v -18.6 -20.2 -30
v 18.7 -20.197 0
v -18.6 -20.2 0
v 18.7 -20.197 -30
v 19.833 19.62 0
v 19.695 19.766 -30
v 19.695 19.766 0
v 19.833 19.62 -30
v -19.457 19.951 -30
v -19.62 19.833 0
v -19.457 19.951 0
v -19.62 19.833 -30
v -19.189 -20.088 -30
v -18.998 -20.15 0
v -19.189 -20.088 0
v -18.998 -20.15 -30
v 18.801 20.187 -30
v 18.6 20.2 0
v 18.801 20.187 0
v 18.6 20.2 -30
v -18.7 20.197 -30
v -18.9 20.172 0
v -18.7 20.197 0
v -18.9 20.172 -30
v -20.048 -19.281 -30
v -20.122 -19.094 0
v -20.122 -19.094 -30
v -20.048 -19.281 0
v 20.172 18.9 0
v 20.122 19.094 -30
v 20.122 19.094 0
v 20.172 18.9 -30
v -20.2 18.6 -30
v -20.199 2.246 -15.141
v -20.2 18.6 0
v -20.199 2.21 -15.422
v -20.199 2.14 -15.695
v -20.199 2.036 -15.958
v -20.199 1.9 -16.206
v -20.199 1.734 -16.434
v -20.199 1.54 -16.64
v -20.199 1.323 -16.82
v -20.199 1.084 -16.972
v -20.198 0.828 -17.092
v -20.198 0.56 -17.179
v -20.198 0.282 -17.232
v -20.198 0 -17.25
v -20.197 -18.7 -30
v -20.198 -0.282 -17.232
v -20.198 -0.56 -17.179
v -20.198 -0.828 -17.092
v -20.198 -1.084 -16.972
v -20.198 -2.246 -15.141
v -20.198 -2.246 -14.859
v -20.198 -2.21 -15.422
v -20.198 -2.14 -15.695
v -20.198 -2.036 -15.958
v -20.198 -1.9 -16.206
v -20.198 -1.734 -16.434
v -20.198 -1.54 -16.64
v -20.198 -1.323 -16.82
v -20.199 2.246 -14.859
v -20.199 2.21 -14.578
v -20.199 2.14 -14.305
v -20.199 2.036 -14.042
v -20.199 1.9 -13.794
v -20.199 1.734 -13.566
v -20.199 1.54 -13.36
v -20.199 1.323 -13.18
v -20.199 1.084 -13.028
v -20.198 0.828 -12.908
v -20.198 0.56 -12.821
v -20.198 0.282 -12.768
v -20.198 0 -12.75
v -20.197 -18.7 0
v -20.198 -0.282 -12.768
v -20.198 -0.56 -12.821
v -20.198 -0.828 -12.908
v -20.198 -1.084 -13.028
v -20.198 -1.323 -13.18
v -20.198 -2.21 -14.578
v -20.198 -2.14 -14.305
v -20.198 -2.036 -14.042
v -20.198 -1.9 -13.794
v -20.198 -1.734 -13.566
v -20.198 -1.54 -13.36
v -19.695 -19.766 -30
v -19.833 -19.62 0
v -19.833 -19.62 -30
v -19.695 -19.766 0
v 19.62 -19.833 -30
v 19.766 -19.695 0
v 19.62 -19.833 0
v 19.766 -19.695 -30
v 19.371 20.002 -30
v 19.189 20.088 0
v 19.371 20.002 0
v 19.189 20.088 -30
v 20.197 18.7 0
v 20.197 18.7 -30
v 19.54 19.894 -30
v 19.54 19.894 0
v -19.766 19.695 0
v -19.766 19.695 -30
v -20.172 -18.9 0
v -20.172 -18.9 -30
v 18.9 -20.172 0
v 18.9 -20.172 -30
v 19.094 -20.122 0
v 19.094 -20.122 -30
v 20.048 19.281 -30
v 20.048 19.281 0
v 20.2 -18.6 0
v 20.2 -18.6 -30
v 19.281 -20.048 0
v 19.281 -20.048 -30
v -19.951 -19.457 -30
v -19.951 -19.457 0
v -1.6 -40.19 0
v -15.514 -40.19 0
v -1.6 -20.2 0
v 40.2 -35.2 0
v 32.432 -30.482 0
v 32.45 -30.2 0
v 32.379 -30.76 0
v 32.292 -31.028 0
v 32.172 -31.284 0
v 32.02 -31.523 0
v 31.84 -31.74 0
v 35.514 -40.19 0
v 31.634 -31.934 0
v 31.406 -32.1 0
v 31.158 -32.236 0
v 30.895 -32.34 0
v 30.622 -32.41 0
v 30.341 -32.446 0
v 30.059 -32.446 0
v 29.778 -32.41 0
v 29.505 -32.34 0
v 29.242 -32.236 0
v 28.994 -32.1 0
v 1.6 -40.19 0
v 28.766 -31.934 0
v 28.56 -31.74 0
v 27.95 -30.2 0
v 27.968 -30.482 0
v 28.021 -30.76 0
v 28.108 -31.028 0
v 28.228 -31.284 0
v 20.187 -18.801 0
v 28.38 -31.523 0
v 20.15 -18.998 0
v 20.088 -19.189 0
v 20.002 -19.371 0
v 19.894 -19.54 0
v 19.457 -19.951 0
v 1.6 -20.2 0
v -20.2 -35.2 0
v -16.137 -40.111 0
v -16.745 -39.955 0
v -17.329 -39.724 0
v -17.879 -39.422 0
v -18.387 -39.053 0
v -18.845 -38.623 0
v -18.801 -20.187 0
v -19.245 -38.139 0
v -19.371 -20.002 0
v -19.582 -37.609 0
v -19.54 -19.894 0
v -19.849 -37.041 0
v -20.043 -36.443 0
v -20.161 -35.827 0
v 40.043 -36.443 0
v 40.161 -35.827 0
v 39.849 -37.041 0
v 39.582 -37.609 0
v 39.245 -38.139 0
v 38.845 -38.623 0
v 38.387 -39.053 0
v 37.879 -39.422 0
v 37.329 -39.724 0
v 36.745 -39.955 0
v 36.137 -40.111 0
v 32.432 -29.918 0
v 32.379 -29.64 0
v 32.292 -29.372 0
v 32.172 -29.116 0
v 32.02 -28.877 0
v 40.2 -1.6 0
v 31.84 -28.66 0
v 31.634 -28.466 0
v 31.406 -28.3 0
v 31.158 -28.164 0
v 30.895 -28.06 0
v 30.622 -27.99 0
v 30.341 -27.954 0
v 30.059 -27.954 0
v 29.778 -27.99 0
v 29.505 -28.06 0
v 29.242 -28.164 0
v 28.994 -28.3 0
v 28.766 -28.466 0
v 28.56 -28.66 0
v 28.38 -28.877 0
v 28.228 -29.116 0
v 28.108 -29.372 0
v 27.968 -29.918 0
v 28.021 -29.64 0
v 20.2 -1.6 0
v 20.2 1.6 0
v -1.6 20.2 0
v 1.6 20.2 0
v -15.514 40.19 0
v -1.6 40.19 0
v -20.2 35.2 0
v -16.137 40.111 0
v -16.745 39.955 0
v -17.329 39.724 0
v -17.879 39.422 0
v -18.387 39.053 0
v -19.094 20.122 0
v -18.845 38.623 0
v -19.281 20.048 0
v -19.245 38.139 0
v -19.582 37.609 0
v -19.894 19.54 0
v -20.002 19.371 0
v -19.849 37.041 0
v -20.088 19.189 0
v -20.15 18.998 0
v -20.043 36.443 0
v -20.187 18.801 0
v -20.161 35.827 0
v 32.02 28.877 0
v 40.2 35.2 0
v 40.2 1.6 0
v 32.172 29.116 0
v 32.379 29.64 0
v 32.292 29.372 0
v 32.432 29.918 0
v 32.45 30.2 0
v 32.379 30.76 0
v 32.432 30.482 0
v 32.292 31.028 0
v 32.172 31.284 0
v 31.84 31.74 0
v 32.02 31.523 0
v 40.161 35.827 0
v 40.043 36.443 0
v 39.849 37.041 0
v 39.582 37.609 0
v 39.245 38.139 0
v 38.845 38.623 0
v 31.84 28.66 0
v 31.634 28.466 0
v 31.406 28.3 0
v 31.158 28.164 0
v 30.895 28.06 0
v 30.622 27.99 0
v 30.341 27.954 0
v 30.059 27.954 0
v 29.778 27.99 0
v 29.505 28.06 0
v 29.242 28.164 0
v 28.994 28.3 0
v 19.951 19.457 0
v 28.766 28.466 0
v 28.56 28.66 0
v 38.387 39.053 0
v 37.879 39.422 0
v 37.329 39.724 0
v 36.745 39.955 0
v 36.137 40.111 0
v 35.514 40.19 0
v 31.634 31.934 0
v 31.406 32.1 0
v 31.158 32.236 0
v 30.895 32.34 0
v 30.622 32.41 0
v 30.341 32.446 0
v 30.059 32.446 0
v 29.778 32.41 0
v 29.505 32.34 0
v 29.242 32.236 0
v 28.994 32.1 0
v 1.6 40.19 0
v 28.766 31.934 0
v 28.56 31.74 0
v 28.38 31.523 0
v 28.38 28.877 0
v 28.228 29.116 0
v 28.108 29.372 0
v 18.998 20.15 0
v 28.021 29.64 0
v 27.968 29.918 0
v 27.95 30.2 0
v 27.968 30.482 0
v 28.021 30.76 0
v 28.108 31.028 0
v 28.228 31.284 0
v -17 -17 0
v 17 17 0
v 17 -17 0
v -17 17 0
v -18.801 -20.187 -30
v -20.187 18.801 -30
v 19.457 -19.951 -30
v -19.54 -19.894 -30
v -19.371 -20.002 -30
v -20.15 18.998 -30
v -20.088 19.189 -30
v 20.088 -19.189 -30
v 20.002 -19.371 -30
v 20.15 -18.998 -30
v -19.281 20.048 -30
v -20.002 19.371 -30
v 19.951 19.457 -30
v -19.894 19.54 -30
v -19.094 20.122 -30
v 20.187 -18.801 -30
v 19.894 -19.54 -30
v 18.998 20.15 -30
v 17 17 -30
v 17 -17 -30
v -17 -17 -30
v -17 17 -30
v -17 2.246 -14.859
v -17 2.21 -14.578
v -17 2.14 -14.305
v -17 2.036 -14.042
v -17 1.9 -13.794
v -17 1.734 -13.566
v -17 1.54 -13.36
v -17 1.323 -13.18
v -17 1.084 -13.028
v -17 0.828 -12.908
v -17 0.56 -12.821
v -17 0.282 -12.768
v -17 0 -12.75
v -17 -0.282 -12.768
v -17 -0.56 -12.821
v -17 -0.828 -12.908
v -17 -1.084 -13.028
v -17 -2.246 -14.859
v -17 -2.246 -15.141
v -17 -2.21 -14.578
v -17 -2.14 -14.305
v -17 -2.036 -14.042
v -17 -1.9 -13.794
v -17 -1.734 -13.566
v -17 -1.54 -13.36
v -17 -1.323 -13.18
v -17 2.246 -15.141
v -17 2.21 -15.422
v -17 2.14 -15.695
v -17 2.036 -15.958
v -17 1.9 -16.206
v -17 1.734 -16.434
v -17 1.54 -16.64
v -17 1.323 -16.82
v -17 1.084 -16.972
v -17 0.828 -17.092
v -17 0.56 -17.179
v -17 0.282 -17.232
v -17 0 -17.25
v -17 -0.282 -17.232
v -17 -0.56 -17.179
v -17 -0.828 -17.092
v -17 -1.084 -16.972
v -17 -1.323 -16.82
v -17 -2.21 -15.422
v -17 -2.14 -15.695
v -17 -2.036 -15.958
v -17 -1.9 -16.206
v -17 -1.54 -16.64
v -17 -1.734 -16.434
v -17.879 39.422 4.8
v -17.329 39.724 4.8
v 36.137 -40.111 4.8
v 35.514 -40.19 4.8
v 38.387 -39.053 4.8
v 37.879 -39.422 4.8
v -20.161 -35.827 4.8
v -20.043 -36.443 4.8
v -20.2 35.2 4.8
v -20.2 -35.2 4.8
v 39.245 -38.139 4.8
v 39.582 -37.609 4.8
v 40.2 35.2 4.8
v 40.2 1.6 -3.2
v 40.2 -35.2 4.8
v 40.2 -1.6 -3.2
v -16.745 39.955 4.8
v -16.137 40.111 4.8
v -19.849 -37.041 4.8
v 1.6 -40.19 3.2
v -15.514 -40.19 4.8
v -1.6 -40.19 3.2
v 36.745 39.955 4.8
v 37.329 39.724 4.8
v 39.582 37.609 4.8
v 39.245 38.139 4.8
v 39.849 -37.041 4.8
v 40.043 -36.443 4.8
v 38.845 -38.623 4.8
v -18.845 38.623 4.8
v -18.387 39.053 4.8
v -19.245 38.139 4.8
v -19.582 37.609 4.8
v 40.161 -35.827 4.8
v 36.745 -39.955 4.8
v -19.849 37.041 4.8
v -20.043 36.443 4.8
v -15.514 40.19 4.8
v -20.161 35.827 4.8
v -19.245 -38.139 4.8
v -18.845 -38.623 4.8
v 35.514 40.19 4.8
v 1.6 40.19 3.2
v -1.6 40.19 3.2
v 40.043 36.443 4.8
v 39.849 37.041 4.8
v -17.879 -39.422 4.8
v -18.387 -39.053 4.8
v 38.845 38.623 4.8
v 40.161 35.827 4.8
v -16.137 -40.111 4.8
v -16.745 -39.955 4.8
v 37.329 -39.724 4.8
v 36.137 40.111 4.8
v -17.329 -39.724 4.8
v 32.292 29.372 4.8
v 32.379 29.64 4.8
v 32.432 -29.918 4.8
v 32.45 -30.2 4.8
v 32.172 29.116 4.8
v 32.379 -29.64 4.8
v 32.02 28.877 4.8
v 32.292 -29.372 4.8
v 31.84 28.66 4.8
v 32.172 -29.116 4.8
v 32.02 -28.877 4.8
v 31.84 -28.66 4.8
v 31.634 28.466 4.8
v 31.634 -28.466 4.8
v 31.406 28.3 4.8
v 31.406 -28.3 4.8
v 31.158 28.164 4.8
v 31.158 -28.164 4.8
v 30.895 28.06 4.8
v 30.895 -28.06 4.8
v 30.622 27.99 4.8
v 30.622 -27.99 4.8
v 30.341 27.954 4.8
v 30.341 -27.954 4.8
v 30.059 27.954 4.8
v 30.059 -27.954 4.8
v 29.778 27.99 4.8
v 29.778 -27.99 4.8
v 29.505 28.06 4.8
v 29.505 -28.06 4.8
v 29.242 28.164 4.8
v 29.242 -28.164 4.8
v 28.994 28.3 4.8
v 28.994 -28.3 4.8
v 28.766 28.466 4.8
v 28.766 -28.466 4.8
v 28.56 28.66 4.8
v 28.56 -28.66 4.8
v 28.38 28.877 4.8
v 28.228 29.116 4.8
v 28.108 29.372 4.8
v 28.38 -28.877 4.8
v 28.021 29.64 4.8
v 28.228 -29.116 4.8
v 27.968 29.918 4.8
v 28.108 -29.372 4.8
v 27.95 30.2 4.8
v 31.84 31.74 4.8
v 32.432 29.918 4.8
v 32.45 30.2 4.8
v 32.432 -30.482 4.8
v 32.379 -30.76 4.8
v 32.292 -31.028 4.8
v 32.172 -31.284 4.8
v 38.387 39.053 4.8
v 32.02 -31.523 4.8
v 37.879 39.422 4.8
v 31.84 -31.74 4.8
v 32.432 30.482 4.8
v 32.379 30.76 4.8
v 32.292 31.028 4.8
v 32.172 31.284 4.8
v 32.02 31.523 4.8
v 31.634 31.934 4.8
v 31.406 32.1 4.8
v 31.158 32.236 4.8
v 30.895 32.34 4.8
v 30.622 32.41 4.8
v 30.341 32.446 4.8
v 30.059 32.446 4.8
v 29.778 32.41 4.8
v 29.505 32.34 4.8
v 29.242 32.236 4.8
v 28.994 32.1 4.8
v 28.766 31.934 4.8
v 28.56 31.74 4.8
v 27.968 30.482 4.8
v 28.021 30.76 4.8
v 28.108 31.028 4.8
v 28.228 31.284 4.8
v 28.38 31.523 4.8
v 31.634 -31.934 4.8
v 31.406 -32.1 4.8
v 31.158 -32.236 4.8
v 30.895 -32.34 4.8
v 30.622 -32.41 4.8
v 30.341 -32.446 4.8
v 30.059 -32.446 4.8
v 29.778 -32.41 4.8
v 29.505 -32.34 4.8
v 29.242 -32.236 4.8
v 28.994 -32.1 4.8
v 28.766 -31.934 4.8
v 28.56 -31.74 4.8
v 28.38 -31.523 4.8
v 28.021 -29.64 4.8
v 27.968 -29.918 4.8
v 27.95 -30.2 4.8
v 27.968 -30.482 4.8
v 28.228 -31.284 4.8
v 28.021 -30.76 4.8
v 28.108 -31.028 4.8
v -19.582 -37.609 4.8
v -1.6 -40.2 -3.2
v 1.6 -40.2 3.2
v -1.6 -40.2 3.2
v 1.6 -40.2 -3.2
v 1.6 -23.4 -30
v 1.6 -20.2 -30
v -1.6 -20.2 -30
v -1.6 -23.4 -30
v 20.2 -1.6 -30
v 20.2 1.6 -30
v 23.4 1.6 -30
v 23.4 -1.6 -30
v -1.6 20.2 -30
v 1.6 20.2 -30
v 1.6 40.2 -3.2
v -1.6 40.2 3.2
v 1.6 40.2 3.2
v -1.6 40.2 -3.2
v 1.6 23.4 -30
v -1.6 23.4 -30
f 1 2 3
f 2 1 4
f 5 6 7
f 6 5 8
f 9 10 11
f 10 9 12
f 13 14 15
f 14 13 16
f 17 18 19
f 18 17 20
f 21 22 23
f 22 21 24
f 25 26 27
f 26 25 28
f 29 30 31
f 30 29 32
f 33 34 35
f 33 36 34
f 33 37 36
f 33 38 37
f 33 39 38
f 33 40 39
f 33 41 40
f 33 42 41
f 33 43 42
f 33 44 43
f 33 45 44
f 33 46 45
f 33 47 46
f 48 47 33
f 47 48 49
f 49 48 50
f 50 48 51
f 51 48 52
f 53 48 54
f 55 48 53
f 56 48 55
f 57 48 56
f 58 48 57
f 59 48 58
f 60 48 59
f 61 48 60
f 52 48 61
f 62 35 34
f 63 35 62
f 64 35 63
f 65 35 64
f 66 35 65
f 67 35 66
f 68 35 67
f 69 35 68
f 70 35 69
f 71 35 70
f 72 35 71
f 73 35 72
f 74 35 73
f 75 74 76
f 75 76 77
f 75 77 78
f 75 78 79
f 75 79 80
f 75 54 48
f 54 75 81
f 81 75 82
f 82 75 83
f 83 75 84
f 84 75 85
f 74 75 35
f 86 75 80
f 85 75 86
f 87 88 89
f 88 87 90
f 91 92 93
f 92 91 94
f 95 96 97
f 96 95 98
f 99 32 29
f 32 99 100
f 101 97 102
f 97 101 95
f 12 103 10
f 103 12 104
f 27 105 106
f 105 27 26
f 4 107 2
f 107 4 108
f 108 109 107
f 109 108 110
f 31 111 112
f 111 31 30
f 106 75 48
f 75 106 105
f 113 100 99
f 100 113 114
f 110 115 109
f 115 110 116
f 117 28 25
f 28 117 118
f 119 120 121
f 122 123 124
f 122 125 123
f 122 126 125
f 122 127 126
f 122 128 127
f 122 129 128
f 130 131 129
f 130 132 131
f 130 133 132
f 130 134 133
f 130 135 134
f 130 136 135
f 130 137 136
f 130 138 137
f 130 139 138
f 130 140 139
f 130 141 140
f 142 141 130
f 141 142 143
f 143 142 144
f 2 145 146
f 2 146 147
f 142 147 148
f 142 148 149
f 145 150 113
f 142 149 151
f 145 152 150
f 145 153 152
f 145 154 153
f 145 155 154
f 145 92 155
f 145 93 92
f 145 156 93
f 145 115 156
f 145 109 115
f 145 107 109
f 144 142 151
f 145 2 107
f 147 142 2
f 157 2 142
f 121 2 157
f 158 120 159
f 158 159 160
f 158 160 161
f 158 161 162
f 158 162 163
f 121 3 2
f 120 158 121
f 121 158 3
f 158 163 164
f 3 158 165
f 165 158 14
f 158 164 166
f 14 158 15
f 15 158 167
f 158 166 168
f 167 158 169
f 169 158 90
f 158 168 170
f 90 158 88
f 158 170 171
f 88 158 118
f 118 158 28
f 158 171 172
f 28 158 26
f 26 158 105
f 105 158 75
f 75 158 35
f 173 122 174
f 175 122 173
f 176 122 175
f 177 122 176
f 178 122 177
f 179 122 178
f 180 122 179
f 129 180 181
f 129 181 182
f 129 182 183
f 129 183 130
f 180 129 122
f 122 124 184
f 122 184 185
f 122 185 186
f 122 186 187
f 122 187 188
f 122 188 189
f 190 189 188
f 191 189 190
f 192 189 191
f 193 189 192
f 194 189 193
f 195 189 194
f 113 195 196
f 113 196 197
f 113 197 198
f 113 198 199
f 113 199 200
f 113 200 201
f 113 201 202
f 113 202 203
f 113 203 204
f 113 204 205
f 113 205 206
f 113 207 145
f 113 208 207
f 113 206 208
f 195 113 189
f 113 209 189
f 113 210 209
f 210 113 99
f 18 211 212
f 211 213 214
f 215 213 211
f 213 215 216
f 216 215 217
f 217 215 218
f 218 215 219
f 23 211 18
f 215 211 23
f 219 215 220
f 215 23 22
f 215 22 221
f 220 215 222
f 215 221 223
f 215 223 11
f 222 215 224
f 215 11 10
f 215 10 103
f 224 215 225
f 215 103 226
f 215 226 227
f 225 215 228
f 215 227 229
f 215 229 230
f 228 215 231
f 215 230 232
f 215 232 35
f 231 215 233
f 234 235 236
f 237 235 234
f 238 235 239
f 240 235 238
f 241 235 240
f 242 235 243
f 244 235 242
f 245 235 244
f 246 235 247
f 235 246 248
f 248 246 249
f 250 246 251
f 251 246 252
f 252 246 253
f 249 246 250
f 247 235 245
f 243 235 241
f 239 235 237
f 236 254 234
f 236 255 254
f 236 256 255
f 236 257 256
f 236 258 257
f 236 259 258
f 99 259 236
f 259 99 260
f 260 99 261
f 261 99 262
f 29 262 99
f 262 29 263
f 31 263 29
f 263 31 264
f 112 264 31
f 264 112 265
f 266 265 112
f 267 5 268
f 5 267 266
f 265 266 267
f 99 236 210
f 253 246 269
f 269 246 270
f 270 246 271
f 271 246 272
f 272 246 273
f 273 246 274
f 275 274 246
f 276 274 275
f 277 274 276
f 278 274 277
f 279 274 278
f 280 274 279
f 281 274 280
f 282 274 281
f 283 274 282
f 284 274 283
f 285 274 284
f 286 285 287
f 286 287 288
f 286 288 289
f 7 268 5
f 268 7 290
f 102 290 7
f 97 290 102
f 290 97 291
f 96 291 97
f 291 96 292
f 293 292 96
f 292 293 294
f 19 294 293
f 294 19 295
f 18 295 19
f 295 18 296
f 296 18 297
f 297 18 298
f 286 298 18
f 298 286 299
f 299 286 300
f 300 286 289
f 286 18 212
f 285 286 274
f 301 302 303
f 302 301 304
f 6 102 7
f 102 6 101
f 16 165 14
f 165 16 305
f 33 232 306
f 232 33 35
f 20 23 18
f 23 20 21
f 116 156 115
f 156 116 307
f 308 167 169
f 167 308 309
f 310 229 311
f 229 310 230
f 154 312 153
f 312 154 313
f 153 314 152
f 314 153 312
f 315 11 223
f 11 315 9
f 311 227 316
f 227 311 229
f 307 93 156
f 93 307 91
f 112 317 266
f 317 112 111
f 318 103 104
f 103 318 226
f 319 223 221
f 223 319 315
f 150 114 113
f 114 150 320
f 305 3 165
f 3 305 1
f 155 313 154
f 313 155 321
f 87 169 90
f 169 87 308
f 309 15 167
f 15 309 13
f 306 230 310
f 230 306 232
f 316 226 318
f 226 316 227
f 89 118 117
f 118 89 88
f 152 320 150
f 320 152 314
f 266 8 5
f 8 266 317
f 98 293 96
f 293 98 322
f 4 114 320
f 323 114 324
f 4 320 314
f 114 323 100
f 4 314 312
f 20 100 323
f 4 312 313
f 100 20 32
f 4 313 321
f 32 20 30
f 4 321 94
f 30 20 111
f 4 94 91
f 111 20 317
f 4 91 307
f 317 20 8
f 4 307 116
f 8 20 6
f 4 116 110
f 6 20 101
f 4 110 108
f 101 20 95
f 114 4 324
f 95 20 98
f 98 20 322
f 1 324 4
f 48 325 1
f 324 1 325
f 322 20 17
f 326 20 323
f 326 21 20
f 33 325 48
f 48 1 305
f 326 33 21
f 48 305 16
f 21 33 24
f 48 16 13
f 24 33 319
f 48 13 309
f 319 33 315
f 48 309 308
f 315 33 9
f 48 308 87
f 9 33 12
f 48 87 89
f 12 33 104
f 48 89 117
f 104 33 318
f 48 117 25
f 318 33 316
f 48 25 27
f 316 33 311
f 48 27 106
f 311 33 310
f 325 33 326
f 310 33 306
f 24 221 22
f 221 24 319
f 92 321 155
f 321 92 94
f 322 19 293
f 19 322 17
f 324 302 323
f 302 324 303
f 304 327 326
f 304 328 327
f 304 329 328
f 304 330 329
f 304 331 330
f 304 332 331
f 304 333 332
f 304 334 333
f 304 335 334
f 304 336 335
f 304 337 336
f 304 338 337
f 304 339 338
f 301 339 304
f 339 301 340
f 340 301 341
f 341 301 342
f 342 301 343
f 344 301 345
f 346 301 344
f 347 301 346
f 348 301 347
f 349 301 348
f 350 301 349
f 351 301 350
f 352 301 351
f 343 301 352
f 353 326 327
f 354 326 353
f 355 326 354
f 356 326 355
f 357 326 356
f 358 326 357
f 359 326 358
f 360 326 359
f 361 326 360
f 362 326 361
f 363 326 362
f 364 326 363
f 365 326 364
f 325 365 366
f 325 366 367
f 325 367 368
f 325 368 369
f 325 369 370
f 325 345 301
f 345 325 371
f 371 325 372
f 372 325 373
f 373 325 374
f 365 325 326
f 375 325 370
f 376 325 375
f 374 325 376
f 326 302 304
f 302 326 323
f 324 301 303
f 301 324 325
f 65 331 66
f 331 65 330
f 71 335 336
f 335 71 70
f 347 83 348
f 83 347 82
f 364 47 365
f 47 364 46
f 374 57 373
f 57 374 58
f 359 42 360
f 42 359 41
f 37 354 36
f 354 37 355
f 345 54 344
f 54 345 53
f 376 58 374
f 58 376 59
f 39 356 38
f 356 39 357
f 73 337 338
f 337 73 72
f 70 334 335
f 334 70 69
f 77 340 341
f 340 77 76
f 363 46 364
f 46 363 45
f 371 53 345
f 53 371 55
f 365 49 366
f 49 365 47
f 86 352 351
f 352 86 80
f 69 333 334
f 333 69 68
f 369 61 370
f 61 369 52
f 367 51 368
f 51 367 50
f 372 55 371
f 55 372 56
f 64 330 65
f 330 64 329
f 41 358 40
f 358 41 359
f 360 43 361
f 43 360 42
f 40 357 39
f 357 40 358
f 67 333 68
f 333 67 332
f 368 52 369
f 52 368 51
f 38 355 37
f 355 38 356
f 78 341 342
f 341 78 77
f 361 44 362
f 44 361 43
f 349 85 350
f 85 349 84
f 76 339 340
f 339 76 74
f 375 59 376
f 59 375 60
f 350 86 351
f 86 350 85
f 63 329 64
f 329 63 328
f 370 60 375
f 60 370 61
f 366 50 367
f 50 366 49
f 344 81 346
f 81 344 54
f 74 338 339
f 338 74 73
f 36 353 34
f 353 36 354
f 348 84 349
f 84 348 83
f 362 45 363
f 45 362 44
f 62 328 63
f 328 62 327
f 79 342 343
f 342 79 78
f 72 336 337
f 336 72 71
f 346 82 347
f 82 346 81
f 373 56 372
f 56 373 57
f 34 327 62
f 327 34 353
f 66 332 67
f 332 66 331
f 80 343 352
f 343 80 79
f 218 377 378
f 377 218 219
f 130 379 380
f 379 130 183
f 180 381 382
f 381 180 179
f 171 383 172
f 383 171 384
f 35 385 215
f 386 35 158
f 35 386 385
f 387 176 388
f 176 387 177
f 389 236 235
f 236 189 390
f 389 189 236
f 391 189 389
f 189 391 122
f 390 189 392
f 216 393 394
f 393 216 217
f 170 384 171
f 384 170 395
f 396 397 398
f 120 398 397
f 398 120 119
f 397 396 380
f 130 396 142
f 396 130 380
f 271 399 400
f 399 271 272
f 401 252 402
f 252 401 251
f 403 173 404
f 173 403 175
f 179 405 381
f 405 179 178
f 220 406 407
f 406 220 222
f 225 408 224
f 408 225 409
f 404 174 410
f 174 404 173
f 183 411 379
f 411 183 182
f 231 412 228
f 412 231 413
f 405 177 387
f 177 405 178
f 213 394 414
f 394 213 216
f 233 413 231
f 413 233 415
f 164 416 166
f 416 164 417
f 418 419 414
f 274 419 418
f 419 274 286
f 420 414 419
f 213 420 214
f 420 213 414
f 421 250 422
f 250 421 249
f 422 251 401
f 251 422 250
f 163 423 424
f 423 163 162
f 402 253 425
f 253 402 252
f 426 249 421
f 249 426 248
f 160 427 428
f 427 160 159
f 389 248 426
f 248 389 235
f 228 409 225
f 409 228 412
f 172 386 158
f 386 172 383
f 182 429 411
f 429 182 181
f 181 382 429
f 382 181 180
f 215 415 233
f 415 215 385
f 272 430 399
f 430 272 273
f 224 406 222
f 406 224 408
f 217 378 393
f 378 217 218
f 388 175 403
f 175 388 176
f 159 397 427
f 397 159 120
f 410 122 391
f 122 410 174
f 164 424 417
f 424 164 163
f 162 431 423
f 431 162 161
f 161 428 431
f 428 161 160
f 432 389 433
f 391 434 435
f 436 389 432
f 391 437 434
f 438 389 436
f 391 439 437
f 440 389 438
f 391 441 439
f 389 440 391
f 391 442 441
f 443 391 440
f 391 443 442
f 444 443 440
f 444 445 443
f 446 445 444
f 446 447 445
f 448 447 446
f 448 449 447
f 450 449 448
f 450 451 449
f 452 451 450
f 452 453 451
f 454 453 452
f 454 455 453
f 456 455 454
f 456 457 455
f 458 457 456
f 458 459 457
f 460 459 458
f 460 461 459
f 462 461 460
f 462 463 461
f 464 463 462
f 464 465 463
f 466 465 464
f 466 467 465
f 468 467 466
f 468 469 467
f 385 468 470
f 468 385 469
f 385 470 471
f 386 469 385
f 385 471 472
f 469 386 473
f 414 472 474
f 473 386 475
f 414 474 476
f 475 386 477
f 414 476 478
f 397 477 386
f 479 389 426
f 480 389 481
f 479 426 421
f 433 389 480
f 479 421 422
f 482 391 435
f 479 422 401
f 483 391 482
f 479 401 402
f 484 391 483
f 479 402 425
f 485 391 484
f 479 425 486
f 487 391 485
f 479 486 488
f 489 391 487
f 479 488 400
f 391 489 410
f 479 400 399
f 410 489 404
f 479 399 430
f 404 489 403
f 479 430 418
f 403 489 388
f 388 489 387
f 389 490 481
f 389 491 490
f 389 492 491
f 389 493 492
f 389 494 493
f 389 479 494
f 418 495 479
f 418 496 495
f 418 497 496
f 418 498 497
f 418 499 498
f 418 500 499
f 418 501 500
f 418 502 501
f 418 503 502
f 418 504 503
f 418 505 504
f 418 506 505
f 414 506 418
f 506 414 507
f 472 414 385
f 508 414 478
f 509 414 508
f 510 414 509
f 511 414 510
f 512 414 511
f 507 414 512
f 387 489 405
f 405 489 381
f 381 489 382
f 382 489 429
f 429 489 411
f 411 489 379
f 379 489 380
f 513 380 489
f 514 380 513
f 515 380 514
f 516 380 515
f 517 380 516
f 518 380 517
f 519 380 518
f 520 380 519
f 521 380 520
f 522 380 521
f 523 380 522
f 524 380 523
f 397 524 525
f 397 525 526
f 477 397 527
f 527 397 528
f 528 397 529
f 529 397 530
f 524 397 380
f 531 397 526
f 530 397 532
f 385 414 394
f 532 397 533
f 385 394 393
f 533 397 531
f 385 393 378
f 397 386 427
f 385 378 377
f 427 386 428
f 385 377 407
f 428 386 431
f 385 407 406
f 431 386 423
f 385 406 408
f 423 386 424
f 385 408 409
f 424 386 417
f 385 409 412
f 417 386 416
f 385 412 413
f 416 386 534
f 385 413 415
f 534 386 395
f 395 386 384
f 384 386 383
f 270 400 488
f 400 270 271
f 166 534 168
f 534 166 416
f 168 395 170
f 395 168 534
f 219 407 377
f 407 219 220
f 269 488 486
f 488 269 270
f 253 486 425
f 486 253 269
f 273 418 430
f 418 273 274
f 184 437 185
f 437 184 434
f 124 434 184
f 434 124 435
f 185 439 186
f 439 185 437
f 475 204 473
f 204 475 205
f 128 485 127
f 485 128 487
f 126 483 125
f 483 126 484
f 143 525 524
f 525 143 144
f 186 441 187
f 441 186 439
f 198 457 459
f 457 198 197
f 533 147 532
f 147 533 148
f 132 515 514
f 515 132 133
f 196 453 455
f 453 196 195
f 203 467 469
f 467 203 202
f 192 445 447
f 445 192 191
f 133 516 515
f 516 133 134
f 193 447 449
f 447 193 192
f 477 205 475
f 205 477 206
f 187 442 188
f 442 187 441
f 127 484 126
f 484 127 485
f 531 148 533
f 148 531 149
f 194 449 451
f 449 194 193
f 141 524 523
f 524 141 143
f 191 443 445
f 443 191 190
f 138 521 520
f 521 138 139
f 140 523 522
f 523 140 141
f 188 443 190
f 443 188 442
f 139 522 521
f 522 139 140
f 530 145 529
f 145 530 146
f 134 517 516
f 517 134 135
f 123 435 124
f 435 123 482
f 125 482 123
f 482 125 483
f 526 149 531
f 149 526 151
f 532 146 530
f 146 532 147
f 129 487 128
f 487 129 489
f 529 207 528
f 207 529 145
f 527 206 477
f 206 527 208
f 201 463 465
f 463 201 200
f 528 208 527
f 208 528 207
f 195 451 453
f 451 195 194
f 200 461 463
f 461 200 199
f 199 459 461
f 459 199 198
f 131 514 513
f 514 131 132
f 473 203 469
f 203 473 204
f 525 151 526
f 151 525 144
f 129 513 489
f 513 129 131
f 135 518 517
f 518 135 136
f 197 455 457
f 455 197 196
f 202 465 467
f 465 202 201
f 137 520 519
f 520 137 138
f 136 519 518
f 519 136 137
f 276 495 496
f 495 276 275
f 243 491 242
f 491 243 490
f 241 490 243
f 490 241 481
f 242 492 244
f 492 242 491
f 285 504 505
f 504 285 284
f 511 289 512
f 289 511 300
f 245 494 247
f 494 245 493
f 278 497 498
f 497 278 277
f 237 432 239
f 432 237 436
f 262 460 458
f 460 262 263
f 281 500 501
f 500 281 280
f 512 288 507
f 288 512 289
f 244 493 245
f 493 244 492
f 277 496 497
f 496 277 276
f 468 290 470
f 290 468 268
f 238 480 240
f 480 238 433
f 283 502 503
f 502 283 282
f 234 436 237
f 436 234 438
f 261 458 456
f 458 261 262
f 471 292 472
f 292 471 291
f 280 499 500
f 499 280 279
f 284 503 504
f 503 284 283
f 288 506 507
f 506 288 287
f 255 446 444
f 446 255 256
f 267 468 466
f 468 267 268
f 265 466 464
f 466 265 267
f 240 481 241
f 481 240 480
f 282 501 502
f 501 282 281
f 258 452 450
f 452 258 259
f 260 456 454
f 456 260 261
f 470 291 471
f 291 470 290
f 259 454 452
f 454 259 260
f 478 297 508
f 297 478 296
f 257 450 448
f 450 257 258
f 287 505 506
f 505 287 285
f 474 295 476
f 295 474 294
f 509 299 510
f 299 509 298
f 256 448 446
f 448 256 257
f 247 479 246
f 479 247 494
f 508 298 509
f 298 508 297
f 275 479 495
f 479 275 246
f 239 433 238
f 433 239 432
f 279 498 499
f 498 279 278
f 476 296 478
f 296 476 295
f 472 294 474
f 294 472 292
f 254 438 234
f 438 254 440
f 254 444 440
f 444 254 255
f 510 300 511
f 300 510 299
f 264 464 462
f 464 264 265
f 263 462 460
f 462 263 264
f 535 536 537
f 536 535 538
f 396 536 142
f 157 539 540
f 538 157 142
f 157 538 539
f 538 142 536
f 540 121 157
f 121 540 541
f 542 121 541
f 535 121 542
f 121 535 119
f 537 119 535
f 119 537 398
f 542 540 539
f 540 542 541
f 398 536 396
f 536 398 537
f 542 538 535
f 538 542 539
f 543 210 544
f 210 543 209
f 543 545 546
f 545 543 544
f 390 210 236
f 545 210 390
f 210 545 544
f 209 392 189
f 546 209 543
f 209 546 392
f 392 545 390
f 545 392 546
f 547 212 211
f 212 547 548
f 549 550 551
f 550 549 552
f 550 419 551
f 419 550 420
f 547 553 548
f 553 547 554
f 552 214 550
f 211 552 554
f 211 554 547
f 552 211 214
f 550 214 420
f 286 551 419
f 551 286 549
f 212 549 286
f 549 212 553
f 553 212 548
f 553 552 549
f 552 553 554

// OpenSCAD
// table leg top plate for upright

// input parameters
// timber
upright_width = 32;     // assumes square
upright_clearance=1;    // clearance each side
// socket dims
wall_thickness = 3.2;
wall_rad=1.6;
wall_height=30;
// top plate and stiffeners
corner_rad=5;
rib=3.2;
top_plate = 4.8;
screw_offset = 10;
screw_edge=10;
// clearance hole for screws
screw_dia = 4.5;

//working variables
corner_distance=(upright_width/2+upright_clearance+wall_thickness);
socket_width=upright_width+2*upright_clearance;
cap_edge=corner_distance+screw_offset+screw_edge;
screw_centre=corner_distance+screw_offset;

// smooth
$fn = 50;

//make the socket
{
    difference(){
        hull(){
            for (side=[0:90:360]) // sides = 1 to 4
                {
                    rotate([0,0,side])
                    translate([corner_distance-wall_rad,-(corner_distance-wall_rad),-wall_height/2])
                    cylinder(h=wall_height,r=wall_rad,center=true);
                }
        }
          
        translate([-socket_width/2,-socket_width/2,-(wall_height+1)])
          cube([socket_width,socket_width,wall_height+2]);
        translate([-corner_distance-1,0,-wall_height/2])
          rotate([0,90,0])
          cylinder(h=wall_thickness+2,d=screw_dia);
    }
}

// add the cap plate
{
    difference(){
        hull(){
            translate([corner_rad-corner_distance,corner_rad-cap_edge,top_plate/2])
                cylinder(h=top_plate,r=corner_rad,center=true);
            translate([cap_edge-corner_rad,corner_rad-cap_edge,top_plate/2])
                cylinder(h=top_plate,r=corner_rad,center=true);
            translate([cap_edge-corner_rad,cap_edge-corner_rad,top_plate/2])
                cylinder(h=top_plate,r=corner_rad,center=true);
            translate([corner_rad-corner_distance,cap_edge-corner_rad,top_plate/2])
                cylinder(h=top_plate,r=corner_rad,center=true);
            }
 
        translate([screw_centre,-screw_centre,top_plate/2])
            cylinder(h=top_plate+2,d=screw_dia,center=true);
        translate([screw_centre,screw_centre,top_plate/2])
            cylinder(h=top_plate+2,d=screw_dia,center=true);
        }
}

//And finally, stiffening ribs
for (side=[-90:90:90]) // sides = 1 to 3
    rotate([0,0,side])
    hull(){
        translate([corner_distance,-rib/2,-wall_height])
            cube(rib);
        translate([cap_edge-rib,-rib/2,-rib])
            cube(rib);
        translate([cap_edge-rib,-rib/2,0])
            cube(rib);
        translate([corner_distance,-rib/2,0])
            cube(rib);
    }
